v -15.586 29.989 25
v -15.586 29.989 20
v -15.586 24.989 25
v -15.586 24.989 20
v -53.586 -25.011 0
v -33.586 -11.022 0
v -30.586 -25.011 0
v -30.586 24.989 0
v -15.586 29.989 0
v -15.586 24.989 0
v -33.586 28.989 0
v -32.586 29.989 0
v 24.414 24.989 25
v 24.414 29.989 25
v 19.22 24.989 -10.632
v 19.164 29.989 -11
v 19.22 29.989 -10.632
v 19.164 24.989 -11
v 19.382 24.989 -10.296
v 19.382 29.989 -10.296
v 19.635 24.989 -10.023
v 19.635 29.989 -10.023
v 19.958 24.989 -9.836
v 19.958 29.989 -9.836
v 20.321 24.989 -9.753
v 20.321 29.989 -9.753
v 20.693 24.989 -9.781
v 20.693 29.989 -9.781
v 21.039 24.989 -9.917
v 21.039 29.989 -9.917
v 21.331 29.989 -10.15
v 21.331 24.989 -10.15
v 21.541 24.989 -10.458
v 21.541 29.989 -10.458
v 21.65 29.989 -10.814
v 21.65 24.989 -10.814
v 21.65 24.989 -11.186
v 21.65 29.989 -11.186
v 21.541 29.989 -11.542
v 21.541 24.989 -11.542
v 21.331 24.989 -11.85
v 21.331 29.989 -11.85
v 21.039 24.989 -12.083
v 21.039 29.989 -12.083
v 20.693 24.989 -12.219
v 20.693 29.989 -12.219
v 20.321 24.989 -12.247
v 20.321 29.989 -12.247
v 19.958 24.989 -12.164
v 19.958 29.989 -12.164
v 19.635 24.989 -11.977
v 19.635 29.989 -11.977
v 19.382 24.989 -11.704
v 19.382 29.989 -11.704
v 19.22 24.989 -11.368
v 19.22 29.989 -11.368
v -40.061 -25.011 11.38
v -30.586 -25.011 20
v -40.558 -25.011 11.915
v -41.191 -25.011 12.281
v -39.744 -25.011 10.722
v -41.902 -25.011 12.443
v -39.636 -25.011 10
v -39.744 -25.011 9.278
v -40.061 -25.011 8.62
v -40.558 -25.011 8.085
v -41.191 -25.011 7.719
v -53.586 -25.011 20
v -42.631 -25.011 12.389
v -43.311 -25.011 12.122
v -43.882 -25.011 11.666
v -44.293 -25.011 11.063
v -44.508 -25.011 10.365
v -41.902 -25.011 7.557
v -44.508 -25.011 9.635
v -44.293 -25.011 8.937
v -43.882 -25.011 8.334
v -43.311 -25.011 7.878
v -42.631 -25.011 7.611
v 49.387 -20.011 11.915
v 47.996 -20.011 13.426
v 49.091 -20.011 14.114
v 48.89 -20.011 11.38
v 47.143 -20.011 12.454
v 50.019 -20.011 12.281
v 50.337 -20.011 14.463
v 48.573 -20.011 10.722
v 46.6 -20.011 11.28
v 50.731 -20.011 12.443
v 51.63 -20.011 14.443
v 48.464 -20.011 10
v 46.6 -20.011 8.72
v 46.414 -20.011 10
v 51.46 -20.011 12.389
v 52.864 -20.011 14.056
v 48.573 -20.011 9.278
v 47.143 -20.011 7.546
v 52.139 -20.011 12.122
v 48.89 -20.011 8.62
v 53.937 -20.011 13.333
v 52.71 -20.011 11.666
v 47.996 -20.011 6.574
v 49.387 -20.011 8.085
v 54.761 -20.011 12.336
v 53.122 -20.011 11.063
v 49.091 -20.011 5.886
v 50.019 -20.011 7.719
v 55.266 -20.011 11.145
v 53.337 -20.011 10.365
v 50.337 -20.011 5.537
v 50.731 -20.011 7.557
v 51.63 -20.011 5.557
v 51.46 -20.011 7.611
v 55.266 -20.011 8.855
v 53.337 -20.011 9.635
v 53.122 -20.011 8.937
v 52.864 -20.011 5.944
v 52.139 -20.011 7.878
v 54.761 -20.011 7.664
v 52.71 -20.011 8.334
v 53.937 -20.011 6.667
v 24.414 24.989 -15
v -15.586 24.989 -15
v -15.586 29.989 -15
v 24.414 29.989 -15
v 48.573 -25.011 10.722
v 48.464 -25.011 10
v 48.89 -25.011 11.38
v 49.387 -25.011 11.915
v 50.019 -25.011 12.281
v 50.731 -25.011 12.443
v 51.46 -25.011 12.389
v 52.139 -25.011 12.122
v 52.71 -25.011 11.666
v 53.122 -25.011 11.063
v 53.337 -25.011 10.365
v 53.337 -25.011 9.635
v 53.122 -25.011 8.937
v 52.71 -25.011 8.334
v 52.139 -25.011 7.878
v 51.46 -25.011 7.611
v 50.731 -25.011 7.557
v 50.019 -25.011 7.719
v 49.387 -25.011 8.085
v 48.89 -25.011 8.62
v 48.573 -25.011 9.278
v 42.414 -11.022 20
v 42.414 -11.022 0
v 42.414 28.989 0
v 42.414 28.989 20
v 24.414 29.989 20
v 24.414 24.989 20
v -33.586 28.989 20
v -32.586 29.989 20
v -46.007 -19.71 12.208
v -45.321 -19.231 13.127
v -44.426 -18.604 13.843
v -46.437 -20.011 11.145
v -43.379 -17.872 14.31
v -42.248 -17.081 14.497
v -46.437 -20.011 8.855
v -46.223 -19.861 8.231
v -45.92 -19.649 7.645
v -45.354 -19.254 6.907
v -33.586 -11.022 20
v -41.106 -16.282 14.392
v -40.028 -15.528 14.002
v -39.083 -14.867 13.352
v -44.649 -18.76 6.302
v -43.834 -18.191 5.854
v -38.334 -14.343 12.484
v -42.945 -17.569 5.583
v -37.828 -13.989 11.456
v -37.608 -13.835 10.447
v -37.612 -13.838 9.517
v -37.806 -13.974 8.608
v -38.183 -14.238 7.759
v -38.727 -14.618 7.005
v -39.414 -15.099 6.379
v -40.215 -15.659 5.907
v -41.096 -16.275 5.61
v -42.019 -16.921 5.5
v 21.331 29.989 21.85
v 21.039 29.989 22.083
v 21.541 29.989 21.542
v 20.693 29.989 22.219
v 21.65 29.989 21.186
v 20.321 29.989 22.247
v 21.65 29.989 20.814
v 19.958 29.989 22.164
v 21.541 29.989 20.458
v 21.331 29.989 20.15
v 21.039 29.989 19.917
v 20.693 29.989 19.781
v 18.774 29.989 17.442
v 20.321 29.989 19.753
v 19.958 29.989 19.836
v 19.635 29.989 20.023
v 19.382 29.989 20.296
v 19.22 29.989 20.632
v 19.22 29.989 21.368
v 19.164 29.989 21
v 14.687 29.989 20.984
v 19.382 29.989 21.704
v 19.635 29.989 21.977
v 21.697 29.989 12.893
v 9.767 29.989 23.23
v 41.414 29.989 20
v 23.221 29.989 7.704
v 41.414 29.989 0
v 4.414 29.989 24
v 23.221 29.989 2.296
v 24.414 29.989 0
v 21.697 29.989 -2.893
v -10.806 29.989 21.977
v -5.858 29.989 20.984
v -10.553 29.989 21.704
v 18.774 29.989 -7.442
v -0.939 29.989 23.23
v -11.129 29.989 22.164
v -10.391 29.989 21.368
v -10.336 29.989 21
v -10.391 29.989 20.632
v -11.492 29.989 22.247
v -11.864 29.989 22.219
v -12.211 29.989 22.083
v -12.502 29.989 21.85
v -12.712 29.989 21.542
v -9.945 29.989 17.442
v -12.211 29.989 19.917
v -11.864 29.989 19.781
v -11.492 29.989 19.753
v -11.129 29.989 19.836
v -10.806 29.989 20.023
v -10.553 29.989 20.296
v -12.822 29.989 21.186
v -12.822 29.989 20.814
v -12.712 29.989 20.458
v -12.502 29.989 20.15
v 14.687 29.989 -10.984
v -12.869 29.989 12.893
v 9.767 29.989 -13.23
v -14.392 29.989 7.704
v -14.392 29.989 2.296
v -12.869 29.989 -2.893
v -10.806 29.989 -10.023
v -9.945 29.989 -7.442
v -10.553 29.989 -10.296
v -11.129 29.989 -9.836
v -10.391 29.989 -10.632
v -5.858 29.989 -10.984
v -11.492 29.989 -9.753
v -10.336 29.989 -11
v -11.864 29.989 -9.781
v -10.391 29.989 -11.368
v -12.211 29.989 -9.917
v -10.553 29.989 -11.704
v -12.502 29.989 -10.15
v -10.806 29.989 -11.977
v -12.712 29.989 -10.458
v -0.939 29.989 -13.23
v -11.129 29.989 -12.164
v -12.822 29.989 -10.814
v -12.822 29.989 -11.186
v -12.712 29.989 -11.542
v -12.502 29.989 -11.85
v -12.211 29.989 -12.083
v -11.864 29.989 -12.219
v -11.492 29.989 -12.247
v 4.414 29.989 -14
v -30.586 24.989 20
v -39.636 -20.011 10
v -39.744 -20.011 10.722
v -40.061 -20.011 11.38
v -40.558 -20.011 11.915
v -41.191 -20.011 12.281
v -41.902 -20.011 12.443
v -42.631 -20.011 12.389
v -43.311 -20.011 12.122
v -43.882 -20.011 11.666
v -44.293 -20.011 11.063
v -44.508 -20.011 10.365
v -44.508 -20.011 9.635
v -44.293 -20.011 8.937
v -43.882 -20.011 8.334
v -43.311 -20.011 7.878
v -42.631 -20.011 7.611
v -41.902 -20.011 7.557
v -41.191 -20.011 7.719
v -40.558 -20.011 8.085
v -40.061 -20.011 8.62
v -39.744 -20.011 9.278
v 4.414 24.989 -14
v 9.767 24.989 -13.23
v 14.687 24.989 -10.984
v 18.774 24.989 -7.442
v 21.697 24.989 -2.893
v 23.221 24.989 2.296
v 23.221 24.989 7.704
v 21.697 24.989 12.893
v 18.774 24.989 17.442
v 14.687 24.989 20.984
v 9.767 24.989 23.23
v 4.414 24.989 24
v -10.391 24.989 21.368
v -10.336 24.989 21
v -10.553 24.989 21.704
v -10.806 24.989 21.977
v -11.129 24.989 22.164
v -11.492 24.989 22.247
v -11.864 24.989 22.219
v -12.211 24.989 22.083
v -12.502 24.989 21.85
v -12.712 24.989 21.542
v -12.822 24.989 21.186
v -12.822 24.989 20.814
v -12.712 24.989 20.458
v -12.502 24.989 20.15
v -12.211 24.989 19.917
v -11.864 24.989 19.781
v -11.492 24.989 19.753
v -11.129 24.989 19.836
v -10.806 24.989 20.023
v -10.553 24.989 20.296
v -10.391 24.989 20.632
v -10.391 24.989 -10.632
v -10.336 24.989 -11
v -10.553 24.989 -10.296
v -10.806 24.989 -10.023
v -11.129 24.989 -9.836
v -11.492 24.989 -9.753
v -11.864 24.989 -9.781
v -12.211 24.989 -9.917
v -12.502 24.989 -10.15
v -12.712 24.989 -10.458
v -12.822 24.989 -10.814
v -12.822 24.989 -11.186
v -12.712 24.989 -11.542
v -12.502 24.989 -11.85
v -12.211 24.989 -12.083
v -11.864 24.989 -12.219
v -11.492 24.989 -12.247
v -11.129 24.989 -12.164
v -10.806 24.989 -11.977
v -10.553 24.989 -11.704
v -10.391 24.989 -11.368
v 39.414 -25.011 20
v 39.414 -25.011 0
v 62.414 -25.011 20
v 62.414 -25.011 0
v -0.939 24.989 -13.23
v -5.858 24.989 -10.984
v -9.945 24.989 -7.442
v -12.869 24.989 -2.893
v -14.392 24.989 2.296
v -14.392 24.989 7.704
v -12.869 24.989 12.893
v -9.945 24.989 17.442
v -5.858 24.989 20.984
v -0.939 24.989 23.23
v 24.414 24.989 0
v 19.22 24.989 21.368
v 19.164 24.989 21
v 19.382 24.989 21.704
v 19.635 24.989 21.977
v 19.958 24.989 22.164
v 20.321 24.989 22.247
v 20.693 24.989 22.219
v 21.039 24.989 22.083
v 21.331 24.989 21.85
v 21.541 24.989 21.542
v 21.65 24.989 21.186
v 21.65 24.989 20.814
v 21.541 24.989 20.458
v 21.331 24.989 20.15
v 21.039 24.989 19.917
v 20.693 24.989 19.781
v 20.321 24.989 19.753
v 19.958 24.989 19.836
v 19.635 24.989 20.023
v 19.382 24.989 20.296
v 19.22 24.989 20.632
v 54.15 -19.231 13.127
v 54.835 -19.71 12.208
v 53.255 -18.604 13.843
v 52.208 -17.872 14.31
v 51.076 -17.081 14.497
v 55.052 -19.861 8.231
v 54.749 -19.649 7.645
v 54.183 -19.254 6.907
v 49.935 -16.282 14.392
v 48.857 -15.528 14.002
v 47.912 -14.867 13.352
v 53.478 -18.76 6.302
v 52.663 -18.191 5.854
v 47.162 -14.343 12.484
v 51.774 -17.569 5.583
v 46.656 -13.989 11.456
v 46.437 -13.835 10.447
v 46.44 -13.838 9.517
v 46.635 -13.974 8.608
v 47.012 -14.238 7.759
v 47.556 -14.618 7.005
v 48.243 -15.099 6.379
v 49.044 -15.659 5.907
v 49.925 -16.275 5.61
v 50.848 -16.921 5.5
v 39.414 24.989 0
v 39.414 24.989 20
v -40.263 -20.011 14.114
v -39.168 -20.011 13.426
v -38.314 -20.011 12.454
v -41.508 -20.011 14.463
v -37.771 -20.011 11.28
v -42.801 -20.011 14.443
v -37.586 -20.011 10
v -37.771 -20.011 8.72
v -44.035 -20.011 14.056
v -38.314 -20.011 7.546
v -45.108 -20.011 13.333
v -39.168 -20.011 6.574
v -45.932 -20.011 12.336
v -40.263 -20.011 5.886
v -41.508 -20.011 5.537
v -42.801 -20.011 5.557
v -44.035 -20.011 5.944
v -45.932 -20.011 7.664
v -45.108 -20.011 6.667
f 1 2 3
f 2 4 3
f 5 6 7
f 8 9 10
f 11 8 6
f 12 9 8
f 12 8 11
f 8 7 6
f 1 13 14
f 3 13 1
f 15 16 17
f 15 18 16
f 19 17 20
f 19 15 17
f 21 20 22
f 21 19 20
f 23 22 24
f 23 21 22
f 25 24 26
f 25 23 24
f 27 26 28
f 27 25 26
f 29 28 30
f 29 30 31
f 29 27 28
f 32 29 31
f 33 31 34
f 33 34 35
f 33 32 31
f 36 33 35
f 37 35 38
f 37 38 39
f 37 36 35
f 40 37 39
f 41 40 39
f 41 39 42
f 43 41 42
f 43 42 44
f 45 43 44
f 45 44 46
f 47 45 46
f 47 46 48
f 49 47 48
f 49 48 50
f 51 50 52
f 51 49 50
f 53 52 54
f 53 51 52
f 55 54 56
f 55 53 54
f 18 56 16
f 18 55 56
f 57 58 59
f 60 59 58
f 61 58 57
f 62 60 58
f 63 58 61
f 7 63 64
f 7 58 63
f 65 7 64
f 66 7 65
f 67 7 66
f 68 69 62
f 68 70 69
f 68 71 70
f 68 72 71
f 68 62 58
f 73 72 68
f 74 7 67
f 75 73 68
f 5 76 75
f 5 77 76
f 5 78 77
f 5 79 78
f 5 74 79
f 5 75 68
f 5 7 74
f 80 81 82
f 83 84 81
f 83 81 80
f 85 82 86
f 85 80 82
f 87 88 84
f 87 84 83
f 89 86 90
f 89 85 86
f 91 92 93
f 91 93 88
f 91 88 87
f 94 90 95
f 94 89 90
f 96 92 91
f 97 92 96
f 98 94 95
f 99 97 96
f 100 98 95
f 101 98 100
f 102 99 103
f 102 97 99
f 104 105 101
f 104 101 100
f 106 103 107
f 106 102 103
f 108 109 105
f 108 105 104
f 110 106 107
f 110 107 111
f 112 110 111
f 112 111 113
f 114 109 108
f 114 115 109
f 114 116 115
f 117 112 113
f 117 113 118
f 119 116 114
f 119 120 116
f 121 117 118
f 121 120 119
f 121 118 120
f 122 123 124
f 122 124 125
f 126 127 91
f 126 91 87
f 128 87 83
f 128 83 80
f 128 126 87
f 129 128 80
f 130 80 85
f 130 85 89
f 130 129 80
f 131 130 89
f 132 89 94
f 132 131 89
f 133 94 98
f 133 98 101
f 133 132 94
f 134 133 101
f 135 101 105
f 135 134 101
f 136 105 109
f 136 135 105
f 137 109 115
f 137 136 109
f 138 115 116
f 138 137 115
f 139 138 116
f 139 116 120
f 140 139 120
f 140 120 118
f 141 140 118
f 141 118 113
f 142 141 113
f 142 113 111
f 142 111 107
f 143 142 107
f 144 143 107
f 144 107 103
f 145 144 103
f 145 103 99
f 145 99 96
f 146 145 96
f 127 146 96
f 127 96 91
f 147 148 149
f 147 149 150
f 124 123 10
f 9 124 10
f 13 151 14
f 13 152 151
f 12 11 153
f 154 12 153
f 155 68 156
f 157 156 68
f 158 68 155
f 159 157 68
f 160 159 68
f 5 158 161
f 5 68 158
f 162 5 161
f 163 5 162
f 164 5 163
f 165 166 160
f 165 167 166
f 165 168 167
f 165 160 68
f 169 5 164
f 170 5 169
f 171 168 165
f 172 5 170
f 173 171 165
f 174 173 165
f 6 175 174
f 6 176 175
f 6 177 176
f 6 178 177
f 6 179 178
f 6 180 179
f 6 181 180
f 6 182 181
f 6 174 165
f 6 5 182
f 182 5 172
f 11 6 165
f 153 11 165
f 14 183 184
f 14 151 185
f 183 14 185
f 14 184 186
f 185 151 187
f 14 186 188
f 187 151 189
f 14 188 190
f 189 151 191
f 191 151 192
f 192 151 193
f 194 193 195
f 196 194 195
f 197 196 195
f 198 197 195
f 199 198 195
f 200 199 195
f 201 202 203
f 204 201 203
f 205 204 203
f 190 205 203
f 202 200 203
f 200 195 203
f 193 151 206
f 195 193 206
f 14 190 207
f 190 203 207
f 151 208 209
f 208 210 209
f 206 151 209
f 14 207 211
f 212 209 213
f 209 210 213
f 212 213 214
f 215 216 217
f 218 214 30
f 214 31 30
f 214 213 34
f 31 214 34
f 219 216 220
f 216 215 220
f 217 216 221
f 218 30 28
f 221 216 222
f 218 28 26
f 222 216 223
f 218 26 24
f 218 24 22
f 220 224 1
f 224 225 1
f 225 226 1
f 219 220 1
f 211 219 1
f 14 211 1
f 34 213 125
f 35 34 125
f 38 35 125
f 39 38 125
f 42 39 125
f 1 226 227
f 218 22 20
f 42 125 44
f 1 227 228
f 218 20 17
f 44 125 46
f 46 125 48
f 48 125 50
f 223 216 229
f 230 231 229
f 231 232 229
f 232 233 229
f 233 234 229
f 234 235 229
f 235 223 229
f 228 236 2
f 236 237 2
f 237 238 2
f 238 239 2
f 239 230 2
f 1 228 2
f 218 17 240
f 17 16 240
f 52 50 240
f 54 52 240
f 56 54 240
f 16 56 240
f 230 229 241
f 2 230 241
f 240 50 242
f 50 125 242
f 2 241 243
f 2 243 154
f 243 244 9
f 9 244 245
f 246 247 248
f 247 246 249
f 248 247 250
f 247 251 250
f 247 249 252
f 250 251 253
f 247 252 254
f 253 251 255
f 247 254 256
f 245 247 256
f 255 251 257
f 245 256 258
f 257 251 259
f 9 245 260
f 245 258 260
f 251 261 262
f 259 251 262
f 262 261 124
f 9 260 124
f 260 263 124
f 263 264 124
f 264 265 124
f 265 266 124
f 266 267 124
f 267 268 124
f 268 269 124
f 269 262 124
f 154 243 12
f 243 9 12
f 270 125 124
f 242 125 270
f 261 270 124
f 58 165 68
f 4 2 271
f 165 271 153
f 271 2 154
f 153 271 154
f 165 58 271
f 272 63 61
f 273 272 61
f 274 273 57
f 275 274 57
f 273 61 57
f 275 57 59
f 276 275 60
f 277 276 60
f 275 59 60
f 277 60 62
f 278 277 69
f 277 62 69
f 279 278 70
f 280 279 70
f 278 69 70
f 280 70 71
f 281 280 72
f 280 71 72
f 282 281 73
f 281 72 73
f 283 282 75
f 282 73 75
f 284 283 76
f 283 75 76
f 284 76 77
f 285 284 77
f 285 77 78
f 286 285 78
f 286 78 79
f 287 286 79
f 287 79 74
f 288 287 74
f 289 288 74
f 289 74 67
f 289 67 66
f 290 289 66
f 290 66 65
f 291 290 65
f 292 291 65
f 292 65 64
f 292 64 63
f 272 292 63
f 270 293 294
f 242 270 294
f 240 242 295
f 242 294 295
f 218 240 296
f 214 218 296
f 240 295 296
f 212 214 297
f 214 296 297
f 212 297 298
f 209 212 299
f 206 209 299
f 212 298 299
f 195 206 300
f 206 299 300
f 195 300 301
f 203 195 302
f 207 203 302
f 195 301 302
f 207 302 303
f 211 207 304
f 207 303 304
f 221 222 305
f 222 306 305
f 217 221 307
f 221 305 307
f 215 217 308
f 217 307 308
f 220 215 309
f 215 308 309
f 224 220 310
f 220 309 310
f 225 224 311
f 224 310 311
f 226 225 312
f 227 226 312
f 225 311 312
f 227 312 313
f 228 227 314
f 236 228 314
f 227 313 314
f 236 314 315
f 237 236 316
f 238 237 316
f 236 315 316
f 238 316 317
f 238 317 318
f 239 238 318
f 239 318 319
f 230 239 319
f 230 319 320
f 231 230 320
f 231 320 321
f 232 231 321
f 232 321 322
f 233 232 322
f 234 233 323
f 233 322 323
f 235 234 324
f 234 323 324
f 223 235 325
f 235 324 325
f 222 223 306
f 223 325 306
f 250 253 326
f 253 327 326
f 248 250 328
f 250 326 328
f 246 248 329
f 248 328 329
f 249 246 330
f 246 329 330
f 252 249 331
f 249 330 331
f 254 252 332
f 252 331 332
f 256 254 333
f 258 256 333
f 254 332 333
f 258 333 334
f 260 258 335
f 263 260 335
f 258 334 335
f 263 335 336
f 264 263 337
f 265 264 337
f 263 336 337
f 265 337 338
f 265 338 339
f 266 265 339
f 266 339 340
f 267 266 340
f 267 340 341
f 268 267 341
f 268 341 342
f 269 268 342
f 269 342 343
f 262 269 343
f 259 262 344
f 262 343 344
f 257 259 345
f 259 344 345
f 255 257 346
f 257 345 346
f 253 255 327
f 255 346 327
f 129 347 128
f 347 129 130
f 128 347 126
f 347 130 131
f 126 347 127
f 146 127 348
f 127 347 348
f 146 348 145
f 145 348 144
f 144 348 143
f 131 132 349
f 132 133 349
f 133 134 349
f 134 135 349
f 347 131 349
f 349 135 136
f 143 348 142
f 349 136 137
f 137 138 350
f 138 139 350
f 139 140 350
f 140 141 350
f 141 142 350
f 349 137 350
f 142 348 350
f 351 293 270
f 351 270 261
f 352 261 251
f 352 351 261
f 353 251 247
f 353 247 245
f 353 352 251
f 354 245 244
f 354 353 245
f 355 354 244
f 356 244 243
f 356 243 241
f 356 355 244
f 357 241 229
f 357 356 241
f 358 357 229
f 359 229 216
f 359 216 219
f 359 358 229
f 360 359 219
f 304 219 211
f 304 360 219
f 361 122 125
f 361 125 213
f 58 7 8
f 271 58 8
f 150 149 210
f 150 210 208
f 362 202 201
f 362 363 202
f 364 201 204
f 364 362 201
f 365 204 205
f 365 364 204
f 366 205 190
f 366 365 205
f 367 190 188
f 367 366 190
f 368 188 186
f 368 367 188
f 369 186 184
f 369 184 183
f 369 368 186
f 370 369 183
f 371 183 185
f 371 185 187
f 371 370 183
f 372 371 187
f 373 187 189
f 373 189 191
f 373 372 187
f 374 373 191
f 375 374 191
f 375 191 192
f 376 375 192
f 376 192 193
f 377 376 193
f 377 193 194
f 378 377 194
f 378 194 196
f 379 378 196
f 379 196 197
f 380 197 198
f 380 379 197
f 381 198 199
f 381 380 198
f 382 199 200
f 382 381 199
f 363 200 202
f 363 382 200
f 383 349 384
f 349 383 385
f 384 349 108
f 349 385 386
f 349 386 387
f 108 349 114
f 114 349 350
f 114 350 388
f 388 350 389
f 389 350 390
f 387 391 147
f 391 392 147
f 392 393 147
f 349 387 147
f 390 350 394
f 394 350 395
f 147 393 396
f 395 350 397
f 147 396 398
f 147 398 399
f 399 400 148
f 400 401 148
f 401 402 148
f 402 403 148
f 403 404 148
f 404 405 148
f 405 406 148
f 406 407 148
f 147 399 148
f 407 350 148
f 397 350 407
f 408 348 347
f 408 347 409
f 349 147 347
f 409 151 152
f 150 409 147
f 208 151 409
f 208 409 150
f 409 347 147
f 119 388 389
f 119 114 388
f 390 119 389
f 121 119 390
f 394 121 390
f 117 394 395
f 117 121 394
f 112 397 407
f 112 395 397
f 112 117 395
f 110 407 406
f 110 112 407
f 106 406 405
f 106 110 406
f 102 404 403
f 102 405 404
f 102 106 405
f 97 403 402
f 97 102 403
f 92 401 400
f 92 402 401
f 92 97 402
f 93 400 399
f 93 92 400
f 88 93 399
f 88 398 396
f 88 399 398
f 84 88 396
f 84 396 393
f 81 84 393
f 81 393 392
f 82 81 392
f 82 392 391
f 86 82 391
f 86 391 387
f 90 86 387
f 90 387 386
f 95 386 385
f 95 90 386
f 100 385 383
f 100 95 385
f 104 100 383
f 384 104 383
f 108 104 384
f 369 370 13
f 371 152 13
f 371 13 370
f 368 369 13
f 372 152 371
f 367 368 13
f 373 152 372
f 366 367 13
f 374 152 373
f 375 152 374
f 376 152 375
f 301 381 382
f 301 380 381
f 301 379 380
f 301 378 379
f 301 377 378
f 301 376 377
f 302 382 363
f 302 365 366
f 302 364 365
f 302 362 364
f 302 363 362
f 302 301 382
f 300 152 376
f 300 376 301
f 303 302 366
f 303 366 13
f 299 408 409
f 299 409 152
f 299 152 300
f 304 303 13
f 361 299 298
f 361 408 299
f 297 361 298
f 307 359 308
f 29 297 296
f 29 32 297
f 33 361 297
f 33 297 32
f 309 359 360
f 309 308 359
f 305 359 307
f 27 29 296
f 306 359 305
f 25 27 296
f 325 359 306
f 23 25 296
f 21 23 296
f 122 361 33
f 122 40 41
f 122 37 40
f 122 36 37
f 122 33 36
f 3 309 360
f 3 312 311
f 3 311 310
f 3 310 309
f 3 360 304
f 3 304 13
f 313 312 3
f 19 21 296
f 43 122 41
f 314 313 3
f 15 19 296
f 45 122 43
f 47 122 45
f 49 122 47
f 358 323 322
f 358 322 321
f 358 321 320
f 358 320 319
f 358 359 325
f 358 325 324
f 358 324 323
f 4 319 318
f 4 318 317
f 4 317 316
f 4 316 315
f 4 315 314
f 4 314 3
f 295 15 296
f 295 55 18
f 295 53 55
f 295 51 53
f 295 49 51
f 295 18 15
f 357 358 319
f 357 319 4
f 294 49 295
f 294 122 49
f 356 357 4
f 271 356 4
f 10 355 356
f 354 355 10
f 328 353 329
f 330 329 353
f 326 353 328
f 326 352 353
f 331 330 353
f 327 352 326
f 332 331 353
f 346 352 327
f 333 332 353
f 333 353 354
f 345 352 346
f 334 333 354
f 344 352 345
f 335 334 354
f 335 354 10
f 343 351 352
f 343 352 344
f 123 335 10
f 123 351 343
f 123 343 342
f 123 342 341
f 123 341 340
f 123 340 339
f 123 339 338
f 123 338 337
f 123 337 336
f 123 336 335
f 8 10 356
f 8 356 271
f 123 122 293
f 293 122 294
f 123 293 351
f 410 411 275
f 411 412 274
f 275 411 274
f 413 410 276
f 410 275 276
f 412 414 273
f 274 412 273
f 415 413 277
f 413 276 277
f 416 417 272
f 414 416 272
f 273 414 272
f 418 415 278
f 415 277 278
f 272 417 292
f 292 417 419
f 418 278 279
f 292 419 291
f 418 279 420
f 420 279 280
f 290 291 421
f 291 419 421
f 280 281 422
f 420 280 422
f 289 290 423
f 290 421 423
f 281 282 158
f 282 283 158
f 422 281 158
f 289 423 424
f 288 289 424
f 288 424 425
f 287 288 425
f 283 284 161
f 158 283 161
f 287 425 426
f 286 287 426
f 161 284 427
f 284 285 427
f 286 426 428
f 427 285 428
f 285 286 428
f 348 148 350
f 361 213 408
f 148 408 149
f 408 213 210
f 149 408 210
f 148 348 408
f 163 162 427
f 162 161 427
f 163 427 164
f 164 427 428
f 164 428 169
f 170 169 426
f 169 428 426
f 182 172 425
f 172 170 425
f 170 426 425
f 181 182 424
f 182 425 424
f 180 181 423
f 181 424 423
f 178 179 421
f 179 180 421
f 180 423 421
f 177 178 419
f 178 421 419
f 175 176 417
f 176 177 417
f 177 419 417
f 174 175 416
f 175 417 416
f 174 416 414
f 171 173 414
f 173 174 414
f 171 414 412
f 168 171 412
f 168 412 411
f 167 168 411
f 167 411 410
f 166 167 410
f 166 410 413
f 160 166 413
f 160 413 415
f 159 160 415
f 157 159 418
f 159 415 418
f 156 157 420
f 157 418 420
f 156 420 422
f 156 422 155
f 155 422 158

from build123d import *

# Parameters (mm, degrees)
EXTRUDE_1_DEPTH     = 20
SKETCH_2_W          = 40
SKETCH_2_H          = 40
EXTRUDE_3_DEPTH     = 3
SKETCH_3_R          = 19
CUT_EXTRUDE_1_DEPTH = 3
SKETCH_4_R          = 1.25
CUT_EXTRUDE_2_DEPTH = 3
SKETCH_5_R          = 19
EXTRUDE_4_DEPTH     = 2
SKETCH_6_R          = 1.25
CUT_EXTRUDE_3_DEPTH = 2
EXTRUDE_5_DEPTH     = 20
CUT_EXTRUDE_4_DEPTH = 59
SKETCH_11_R         = 2.45
CUT_EXTRUDE_5_DEPTH = 59
SKETCH_12_R         = 4.5
CUT_EXTRUDE_6_DEPTH = 59
CHAMFER_1_SIZE      = 1


with BuildPart() as part:
    # 草图1 → 凸台-拉伸1 (new body)
    with BuildSketch(Plane.XY):
        Polygon((-33.585585586, 27.988738739), (-33.585585586, -25.011261261), (-30.585585586, -25.011261261), (-30.585585586, 24.988738739), (39.414414414, 24.988738739), (39.414414414, -25.011261261), (42.414414414, -25.011261261), (42.414414414, 27.988738739), align=None)
    extrude(amount=EXTRUDE_1_DEPTH)

    # 草图2 → 凸台-拉伸3 (add)
    with BuildSketch(Plane(origin=(0, 27.988738739, 0), x_dir=(1, 0, 0), z_dir=(0, 1, 0))):
        with Locations((4.414414414, -5)):
            Rectangle(SKETCH_2_W, SKETCH_2_H)
    extrude(amount=-EXTRUDE_3_DEPTH)

    # 草图3 → 切除-拉伸1 (cut)
    with BuildSketch(Plane(origin=(0, 27.988738739, 0), x_dir=(1, 0, 0), z_dir=(0, 1, 0))):
        with Locations((4.414414414, -5)):
            Circle(SKETCH_3_R)
    extrude(amount=-CUT_EXTRUDE_1_DEPTH, mode=Mode.SUBTRACT)

    # 草图4 → 切除-拉伸2 (cut)
    with BuildSketch(Plane(origin=(0, 27.988738739, 0), x_dir=(1, 0, 0), z_dir=(0, 1, 0))):
        with Locations((20.414414414, 11)):
            Circle(SKETCH_4_R)
        with Locations((20.414414414, -21)):
            Circle(SKETCH_4_R)
        with Locations((-11.585585586, -21)):
            Circle(SKETCH_4_R)
        with Locations((-11.585585586, 11)):
            Circle(SKETCH_4_R)
    extrude(amount=-CUT_EXTRUDE_2_DEPTH, mode=Mode.SUBTRACT)

    # 草图5 → 凸台-拉伸4 (add)
    with BuildSketch(Plane(origin=(0, 27.988738739, 0), x_dir=(1, 0, 0), z_dir=(0, 1, 0))):
        Polygon((-33.585585586, -20), (-15.585585586, -20), (-15.585585586, -25), (24.414414414, -25), (24.414414414, -20), (42.414414414, -20), (42.414414414, 0), (24.414414414, 0), (24.414414414, 15), (-15.585585586, 15), (-15.585585586, 0), (-33.585585586, 0), align=None)
        with Locations((4.414414414, -5)):
            Circle(SKETCH_5_R, mode=Mode.SUBTRACT)
    extrude(amount=EXTRUDE_4_DEPTH)

    # 草图6 → 切除-拉伸3 (cut)
    with BuildSketch(Plane.XZ.offset(-27.988738739)):
        with Locations((20.414414414, 21)):
            Circle(SKETCH_6_R)
        with Locations((20.414414414, -11)):
            Circle(SKETCH_6_R)
        with Locations((-11.585585586, -11)):
            Circle(SKETCH_6_R)
        with Locations((-11.585585586, 21)):
            Circle(SKETCH_6_R)
    extrude(amount=-CUT_EXTRUDE_3_DEPTH, mode=Mode.SUBTRACT)

    # 草图7 → 凸台-拉伸5 (add)
    with BuildSketch(Plane(origin=(0, 0, 0), x_dir=(-1, 0, 0), z_dir=(0, 0, -1))):
        Polygon((33.585585586, -25.011261261), (53.585585586, -25.011261261), (33.585585586, -11.021791252), align=None)
    extrude(amount=-EXTRUDE_5_DEPTH)

    # 草图10 → 切除-拉伸4 (cut)
    with BuildSketch(Plane(origin=(0, 0, -15), x_dir=(-1, 0, 0), z_dir=(0, 0, -1))):
        Polygon((-4.414414414, 24.988738739), (-4.414414414, -56.650285004), (-57.489425736, -56.650285004), (-57.489425736, 45.664413948), (-4.414414414, 45.664413948), align=None)
    extrude(amount=-CUT_EXTRUDE_4_DEPTH, mode=Mode.SUBTRACT)

    # 草图11 → 切除-拉伸5 (cut)
    with BuildSketch(Plane.XZ.offset(25.011261261)):
        with Locations((-42.085585586, 10)):
            Circle(SKETCH_11_R)
    extrude(amount=-CUT_EXTRUDE_5_DEPTH, mode=Mode.SUBTRACT)

    # 草图12 → 切除-拉伸6 (cut)
    with BuildSketch(Plane(origin=(0, -20.011261261, 0), x_dir=(-1, 0, 0), z_dir=(0, -1, 0))):
        with Locations((42.085585586, -10)):
            Circle(SKETCH_12_R)
    extrude(amount=-CUT_EXTRUDE_6_DEPTH, mode=Mode.SUBTRACT)

    # 镜向2: part across plane


with BuildPart() as part_1:
    add(part.part)
    add(part.part.mirror(Plane(origin=(4.414414414, 24.988738739, 44), x_dir=(0, 0, 1), z_dir=(-1, 0, 0))))

    # 倒角1
    chamfer_1_edges = [part_1.edges().sort_by_distance(p)[0] for p in [
        (42.414414414, 29.988738739, 10),
        (-33.585585586, 29.988738739, 10),
    ]]
    chamfer(chamfer_1_edges, length=CHAMFER_1_SIZE)


solid = part_1.part
